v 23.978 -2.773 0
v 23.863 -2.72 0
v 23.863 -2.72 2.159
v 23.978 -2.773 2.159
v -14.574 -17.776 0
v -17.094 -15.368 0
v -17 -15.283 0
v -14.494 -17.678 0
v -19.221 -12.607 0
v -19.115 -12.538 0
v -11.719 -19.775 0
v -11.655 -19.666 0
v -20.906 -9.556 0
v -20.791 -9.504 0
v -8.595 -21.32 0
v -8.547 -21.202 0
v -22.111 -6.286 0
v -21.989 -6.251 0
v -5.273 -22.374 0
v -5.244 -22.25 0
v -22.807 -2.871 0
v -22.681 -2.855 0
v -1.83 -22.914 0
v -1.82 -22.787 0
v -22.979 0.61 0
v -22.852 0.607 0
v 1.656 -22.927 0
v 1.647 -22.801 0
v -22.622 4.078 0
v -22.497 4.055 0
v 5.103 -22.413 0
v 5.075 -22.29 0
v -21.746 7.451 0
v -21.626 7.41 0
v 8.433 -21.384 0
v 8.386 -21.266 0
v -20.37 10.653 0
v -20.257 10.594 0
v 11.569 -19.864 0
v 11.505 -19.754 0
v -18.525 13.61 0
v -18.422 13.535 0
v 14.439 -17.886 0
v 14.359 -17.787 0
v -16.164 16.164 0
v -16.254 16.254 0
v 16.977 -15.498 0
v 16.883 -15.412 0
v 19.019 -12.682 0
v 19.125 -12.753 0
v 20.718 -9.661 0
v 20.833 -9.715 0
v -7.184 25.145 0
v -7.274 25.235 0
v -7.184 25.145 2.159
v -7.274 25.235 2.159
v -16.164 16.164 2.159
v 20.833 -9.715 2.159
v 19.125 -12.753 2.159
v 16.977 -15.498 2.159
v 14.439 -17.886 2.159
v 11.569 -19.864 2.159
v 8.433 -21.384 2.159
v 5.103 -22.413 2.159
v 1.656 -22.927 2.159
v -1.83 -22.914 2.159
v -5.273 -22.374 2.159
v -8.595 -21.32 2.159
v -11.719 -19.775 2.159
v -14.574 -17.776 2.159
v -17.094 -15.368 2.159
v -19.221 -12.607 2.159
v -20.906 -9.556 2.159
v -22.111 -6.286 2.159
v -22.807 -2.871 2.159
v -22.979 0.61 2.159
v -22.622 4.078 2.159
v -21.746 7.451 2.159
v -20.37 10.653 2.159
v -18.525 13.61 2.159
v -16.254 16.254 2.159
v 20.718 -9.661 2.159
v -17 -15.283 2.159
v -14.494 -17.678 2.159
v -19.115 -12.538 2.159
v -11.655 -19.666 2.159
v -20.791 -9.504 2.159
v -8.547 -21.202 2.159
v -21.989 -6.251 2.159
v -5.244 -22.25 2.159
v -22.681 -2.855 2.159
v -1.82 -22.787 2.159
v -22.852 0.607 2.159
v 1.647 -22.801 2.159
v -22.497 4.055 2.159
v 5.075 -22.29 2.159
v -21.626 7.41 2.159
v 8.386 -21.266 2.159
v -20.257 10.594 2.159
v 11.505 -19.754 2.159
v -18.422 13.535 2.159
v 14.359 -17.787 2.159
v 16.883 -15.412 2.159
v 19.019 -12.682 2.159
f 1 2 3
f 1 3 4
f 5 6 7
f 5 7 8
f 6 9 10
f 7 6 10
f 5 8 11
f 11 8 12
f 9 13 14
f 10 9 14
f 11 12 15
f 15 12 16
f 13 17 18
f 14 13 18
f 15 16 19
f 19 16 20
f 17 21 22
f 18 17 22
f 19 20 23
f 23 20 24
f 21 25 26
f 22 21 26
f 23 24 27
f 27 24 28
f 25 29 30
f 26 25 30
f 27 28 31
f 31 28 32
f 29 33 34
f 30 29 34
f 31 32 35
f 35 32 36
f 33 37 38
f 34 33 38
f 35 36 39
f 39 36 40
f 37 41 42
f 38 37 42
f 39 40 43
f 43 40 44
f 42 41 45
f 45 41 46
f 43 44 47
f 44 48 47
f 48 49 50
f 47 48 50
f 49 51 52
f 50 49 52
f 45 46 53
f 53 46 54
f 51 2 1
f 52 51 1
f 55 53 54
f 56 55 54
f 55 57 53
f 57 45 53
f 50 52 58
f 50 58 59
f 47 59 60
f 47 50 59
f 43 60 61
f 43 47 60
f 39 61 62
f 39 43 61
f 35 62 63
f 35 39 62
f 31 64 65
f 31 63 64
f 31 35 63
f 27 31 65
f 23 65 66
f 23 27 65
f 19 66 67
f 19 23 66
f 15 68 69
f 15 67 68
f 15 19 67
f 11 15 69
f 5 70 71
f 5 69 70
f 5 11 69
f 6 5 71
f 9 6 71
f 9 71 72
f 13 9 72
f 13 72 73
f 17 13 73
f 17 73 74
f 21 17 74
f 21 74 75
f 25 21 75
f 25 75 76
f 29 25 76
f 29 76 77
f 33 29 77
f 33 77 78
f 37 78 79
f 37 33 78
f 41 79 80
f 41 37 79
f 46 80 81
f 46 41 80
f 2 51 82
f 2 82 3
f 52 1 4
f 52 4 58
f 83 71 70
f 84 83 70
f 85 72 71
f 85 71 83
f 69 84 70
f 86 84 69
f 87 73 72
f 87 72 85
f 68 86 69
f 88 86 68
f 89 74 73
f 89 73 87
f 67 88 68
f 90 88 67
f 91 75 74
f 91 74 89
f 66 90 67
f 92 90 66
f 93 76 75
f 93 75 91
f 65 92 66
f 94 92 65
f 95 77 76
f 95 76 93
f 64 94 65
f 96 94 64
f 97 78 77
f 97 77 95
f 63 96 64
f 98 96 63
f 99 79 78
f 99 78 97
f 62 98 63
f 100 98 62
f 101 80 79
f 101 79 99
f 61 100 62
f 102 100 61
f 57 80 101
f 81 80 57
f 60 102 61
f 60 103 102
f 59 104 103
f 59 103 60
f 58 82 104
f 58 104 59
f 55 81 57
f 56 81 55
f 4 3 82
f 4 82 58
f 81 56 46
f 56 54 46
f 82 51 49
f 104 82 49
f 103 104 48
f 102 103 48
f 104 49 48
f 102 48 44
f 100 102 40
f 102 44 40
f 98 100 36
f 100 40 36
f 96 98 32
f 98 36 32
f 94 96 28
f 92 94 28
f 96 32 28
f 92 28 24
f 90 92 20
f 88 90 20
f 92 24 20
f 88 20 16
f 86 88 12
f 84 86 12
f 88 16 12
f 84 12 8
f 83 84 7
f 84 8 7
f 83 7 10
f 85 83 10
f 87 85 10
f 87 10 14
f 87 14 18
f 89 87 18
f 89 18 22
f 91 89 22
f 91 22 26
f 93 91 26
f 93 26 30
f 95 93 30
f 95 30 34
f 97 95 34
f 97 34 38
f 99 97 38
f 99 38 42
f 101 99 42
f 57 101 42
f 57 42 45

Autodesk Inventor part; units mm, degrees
ref_plane "YZ Plane" through (0, 0, 0) normal (1, 0, 0) x (0, 1, 0)
ref_plane "XZ Plane" through (0, 0, 0) normal (0, 1, 0) x (-1, 0, 0)
ref_plane "XY Plane" through (0, 0, 0) normal (0, 0, 1) x (1, 0, 0)
sketch "Sketch1" plane through (0, 0, 0) normal (0, 0, 1) x (1, 0, 0)
  arc A0 (-16.164461, 16.164461) -> (20.718196, -9.661053) centre (0, 0) ccw
  arc A1 (-16.254264, 16.254264) -> (20.833297, -9.714726) centre (0, 0) ccw
  line L0 (-16.254264, 16.254264) -> (-16.164461, 16.164461)
  line L1 (20.718196, -9.661053) -> (20.833297, -9.714726)
  line L2 (0, 0) -> (15.160579, 0) construction
  line L3 (20.718196, -9.661053) -> (23.862711, -2.72013)
  line L4 (23.862711, -2.72013) -> (23.978386, -2.772535)
  line L5 (23.978386, -2.772535) -> (20.833297, -9.714726)
  line L6 (-16.254264, 16.254264) -> (-7.274007, 25.23452)
  line L7 (-7.274007, 25.23452) -> (-7.184205, 25.144717)
  line L8 (-7.184205, 25.144717) -> (-16.164461, 16.164461)
  line L9 (0, 0) -> (0, 16.116809) construction
  dimension "d0" = 45.72
  dimension "d1" = 45.974
  dimension "d2" = 25
  dimension "d3" = 7.62
  dimension "d5" = 12.7
  dimension "d6" = 45
sketch "Sketch1 outline for Extrusion1" plane through (0, 0, 0) normal (0, 0, 1) x (1, 0, 0)
  line L0 (-7.274007, 25.23452) -> (-16.254264, 16.254264)
  arc A0 (-16.254264, 16.254264) -> (20.833297, -9.714726) centre (0, 0) ccw
  line L1 (23.978386, -2.772535) -> (20.833297, -9.714726)
  line L2 (23.862711, -2.72013) -> (23.978386, -2.772535)
  line L3 (20.718196, -9.661053) -> (23.862711, -2.72013)
  arc A1 (20.718196, -9.661053) -> (-16.164461, 16.164461) centre (0, 0) cw
  line L4 (-16.164461, 16.164461) -> (-7.184205, 25.144717)
  line L5 (-7.184205, 25.144717) -> (-7.274007, 25.23452)
extrude "Extrusion1" add sketch "Sketch1 outline for Extrusion1" along normal blind 2.159
properties part number "CopperContact" material "Copper, Alloy"
